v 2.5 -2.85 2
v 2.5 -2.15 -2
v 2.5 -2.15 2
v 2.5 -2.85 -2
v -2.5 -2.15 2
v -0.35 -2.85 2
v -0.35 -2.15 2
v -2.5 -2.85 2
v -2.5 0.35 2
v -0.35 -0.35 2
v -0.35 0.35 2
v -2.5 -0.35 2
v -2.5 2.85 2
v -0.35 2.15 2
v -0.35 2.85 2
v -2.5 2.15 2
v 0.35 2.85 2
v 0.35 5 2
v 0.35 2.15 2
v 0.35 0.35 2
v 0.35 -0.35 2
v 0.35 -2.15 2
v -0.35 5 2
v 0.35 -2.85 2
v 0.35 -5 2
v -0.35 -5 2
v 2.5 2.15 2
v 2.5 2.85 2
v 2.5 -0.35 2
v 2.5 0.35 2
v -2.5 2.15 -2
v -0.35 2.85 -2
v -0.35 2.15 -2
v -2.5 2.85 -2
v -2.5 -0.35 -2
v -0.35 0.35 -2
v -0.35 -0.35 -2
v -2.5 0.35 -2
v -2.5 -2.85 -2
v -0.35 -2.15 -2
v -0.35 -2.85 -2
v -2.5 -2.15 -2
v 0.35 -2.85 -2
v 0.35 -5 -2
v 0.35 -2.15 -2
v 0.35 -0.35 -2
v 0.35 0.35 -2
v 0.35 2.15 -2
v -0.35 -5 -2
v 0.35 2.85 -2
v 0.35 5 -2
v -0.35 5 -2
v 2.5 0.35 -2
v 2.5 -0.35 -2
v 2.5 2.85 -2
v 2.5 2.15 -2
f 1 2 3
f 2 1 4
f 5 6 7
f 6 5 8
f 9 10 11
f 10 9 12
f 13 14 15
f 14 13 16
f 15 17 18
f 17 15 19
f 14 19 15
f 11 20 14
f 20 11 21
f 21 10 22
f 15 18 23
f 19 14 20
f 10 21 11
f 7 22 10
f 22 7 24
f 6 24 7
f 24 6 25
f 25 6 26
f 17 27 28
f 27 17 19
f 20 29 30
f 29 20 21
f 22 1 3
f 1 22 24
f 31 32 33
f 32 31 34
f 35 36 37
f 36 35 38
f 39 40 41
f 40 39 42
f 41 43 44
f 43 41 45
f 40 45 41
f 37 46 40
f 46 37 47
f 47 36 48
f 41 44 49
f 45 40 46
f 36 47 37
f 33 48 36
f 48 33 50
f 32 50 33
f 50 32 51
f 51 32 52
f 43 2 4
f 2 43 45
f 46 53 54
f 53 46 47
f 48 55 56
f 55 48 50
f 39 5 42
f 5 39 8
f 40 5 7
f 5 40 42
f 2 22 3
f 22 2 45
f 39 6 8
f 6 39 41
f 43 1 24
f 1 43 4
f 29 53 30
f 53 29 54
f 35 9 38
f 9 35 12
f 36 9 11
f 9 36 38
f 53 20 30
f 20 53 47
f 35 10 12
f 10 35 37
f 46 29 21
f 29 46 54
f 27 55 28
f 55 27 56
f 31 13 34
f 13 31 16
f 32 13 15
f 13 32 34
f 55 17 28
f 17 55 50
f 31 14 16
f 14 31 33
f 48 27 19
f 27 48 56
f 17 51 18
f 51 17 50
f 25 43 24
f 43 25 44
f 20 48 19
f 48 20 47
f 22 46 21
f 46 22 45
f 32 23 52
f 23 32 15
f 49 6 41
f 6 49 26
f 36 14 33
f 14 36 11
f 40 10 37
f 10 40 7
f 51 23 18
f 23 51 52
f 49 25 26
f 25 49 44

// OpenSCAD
t = 0.7;
h = 4;
pitch = 2.5;

x = 2;
y = 4;

for (i = [1:1:x-1]){
    translate([(i - (x/2)) * pitch, 0, 0])
    cube([t, y * pitch, h], center=true);
}

for (j = [1:1:y-1]){
    translate([0, (j - (y/2)) * pitch, 0])
    cube([x * pitch, t, h], center=true);
}
